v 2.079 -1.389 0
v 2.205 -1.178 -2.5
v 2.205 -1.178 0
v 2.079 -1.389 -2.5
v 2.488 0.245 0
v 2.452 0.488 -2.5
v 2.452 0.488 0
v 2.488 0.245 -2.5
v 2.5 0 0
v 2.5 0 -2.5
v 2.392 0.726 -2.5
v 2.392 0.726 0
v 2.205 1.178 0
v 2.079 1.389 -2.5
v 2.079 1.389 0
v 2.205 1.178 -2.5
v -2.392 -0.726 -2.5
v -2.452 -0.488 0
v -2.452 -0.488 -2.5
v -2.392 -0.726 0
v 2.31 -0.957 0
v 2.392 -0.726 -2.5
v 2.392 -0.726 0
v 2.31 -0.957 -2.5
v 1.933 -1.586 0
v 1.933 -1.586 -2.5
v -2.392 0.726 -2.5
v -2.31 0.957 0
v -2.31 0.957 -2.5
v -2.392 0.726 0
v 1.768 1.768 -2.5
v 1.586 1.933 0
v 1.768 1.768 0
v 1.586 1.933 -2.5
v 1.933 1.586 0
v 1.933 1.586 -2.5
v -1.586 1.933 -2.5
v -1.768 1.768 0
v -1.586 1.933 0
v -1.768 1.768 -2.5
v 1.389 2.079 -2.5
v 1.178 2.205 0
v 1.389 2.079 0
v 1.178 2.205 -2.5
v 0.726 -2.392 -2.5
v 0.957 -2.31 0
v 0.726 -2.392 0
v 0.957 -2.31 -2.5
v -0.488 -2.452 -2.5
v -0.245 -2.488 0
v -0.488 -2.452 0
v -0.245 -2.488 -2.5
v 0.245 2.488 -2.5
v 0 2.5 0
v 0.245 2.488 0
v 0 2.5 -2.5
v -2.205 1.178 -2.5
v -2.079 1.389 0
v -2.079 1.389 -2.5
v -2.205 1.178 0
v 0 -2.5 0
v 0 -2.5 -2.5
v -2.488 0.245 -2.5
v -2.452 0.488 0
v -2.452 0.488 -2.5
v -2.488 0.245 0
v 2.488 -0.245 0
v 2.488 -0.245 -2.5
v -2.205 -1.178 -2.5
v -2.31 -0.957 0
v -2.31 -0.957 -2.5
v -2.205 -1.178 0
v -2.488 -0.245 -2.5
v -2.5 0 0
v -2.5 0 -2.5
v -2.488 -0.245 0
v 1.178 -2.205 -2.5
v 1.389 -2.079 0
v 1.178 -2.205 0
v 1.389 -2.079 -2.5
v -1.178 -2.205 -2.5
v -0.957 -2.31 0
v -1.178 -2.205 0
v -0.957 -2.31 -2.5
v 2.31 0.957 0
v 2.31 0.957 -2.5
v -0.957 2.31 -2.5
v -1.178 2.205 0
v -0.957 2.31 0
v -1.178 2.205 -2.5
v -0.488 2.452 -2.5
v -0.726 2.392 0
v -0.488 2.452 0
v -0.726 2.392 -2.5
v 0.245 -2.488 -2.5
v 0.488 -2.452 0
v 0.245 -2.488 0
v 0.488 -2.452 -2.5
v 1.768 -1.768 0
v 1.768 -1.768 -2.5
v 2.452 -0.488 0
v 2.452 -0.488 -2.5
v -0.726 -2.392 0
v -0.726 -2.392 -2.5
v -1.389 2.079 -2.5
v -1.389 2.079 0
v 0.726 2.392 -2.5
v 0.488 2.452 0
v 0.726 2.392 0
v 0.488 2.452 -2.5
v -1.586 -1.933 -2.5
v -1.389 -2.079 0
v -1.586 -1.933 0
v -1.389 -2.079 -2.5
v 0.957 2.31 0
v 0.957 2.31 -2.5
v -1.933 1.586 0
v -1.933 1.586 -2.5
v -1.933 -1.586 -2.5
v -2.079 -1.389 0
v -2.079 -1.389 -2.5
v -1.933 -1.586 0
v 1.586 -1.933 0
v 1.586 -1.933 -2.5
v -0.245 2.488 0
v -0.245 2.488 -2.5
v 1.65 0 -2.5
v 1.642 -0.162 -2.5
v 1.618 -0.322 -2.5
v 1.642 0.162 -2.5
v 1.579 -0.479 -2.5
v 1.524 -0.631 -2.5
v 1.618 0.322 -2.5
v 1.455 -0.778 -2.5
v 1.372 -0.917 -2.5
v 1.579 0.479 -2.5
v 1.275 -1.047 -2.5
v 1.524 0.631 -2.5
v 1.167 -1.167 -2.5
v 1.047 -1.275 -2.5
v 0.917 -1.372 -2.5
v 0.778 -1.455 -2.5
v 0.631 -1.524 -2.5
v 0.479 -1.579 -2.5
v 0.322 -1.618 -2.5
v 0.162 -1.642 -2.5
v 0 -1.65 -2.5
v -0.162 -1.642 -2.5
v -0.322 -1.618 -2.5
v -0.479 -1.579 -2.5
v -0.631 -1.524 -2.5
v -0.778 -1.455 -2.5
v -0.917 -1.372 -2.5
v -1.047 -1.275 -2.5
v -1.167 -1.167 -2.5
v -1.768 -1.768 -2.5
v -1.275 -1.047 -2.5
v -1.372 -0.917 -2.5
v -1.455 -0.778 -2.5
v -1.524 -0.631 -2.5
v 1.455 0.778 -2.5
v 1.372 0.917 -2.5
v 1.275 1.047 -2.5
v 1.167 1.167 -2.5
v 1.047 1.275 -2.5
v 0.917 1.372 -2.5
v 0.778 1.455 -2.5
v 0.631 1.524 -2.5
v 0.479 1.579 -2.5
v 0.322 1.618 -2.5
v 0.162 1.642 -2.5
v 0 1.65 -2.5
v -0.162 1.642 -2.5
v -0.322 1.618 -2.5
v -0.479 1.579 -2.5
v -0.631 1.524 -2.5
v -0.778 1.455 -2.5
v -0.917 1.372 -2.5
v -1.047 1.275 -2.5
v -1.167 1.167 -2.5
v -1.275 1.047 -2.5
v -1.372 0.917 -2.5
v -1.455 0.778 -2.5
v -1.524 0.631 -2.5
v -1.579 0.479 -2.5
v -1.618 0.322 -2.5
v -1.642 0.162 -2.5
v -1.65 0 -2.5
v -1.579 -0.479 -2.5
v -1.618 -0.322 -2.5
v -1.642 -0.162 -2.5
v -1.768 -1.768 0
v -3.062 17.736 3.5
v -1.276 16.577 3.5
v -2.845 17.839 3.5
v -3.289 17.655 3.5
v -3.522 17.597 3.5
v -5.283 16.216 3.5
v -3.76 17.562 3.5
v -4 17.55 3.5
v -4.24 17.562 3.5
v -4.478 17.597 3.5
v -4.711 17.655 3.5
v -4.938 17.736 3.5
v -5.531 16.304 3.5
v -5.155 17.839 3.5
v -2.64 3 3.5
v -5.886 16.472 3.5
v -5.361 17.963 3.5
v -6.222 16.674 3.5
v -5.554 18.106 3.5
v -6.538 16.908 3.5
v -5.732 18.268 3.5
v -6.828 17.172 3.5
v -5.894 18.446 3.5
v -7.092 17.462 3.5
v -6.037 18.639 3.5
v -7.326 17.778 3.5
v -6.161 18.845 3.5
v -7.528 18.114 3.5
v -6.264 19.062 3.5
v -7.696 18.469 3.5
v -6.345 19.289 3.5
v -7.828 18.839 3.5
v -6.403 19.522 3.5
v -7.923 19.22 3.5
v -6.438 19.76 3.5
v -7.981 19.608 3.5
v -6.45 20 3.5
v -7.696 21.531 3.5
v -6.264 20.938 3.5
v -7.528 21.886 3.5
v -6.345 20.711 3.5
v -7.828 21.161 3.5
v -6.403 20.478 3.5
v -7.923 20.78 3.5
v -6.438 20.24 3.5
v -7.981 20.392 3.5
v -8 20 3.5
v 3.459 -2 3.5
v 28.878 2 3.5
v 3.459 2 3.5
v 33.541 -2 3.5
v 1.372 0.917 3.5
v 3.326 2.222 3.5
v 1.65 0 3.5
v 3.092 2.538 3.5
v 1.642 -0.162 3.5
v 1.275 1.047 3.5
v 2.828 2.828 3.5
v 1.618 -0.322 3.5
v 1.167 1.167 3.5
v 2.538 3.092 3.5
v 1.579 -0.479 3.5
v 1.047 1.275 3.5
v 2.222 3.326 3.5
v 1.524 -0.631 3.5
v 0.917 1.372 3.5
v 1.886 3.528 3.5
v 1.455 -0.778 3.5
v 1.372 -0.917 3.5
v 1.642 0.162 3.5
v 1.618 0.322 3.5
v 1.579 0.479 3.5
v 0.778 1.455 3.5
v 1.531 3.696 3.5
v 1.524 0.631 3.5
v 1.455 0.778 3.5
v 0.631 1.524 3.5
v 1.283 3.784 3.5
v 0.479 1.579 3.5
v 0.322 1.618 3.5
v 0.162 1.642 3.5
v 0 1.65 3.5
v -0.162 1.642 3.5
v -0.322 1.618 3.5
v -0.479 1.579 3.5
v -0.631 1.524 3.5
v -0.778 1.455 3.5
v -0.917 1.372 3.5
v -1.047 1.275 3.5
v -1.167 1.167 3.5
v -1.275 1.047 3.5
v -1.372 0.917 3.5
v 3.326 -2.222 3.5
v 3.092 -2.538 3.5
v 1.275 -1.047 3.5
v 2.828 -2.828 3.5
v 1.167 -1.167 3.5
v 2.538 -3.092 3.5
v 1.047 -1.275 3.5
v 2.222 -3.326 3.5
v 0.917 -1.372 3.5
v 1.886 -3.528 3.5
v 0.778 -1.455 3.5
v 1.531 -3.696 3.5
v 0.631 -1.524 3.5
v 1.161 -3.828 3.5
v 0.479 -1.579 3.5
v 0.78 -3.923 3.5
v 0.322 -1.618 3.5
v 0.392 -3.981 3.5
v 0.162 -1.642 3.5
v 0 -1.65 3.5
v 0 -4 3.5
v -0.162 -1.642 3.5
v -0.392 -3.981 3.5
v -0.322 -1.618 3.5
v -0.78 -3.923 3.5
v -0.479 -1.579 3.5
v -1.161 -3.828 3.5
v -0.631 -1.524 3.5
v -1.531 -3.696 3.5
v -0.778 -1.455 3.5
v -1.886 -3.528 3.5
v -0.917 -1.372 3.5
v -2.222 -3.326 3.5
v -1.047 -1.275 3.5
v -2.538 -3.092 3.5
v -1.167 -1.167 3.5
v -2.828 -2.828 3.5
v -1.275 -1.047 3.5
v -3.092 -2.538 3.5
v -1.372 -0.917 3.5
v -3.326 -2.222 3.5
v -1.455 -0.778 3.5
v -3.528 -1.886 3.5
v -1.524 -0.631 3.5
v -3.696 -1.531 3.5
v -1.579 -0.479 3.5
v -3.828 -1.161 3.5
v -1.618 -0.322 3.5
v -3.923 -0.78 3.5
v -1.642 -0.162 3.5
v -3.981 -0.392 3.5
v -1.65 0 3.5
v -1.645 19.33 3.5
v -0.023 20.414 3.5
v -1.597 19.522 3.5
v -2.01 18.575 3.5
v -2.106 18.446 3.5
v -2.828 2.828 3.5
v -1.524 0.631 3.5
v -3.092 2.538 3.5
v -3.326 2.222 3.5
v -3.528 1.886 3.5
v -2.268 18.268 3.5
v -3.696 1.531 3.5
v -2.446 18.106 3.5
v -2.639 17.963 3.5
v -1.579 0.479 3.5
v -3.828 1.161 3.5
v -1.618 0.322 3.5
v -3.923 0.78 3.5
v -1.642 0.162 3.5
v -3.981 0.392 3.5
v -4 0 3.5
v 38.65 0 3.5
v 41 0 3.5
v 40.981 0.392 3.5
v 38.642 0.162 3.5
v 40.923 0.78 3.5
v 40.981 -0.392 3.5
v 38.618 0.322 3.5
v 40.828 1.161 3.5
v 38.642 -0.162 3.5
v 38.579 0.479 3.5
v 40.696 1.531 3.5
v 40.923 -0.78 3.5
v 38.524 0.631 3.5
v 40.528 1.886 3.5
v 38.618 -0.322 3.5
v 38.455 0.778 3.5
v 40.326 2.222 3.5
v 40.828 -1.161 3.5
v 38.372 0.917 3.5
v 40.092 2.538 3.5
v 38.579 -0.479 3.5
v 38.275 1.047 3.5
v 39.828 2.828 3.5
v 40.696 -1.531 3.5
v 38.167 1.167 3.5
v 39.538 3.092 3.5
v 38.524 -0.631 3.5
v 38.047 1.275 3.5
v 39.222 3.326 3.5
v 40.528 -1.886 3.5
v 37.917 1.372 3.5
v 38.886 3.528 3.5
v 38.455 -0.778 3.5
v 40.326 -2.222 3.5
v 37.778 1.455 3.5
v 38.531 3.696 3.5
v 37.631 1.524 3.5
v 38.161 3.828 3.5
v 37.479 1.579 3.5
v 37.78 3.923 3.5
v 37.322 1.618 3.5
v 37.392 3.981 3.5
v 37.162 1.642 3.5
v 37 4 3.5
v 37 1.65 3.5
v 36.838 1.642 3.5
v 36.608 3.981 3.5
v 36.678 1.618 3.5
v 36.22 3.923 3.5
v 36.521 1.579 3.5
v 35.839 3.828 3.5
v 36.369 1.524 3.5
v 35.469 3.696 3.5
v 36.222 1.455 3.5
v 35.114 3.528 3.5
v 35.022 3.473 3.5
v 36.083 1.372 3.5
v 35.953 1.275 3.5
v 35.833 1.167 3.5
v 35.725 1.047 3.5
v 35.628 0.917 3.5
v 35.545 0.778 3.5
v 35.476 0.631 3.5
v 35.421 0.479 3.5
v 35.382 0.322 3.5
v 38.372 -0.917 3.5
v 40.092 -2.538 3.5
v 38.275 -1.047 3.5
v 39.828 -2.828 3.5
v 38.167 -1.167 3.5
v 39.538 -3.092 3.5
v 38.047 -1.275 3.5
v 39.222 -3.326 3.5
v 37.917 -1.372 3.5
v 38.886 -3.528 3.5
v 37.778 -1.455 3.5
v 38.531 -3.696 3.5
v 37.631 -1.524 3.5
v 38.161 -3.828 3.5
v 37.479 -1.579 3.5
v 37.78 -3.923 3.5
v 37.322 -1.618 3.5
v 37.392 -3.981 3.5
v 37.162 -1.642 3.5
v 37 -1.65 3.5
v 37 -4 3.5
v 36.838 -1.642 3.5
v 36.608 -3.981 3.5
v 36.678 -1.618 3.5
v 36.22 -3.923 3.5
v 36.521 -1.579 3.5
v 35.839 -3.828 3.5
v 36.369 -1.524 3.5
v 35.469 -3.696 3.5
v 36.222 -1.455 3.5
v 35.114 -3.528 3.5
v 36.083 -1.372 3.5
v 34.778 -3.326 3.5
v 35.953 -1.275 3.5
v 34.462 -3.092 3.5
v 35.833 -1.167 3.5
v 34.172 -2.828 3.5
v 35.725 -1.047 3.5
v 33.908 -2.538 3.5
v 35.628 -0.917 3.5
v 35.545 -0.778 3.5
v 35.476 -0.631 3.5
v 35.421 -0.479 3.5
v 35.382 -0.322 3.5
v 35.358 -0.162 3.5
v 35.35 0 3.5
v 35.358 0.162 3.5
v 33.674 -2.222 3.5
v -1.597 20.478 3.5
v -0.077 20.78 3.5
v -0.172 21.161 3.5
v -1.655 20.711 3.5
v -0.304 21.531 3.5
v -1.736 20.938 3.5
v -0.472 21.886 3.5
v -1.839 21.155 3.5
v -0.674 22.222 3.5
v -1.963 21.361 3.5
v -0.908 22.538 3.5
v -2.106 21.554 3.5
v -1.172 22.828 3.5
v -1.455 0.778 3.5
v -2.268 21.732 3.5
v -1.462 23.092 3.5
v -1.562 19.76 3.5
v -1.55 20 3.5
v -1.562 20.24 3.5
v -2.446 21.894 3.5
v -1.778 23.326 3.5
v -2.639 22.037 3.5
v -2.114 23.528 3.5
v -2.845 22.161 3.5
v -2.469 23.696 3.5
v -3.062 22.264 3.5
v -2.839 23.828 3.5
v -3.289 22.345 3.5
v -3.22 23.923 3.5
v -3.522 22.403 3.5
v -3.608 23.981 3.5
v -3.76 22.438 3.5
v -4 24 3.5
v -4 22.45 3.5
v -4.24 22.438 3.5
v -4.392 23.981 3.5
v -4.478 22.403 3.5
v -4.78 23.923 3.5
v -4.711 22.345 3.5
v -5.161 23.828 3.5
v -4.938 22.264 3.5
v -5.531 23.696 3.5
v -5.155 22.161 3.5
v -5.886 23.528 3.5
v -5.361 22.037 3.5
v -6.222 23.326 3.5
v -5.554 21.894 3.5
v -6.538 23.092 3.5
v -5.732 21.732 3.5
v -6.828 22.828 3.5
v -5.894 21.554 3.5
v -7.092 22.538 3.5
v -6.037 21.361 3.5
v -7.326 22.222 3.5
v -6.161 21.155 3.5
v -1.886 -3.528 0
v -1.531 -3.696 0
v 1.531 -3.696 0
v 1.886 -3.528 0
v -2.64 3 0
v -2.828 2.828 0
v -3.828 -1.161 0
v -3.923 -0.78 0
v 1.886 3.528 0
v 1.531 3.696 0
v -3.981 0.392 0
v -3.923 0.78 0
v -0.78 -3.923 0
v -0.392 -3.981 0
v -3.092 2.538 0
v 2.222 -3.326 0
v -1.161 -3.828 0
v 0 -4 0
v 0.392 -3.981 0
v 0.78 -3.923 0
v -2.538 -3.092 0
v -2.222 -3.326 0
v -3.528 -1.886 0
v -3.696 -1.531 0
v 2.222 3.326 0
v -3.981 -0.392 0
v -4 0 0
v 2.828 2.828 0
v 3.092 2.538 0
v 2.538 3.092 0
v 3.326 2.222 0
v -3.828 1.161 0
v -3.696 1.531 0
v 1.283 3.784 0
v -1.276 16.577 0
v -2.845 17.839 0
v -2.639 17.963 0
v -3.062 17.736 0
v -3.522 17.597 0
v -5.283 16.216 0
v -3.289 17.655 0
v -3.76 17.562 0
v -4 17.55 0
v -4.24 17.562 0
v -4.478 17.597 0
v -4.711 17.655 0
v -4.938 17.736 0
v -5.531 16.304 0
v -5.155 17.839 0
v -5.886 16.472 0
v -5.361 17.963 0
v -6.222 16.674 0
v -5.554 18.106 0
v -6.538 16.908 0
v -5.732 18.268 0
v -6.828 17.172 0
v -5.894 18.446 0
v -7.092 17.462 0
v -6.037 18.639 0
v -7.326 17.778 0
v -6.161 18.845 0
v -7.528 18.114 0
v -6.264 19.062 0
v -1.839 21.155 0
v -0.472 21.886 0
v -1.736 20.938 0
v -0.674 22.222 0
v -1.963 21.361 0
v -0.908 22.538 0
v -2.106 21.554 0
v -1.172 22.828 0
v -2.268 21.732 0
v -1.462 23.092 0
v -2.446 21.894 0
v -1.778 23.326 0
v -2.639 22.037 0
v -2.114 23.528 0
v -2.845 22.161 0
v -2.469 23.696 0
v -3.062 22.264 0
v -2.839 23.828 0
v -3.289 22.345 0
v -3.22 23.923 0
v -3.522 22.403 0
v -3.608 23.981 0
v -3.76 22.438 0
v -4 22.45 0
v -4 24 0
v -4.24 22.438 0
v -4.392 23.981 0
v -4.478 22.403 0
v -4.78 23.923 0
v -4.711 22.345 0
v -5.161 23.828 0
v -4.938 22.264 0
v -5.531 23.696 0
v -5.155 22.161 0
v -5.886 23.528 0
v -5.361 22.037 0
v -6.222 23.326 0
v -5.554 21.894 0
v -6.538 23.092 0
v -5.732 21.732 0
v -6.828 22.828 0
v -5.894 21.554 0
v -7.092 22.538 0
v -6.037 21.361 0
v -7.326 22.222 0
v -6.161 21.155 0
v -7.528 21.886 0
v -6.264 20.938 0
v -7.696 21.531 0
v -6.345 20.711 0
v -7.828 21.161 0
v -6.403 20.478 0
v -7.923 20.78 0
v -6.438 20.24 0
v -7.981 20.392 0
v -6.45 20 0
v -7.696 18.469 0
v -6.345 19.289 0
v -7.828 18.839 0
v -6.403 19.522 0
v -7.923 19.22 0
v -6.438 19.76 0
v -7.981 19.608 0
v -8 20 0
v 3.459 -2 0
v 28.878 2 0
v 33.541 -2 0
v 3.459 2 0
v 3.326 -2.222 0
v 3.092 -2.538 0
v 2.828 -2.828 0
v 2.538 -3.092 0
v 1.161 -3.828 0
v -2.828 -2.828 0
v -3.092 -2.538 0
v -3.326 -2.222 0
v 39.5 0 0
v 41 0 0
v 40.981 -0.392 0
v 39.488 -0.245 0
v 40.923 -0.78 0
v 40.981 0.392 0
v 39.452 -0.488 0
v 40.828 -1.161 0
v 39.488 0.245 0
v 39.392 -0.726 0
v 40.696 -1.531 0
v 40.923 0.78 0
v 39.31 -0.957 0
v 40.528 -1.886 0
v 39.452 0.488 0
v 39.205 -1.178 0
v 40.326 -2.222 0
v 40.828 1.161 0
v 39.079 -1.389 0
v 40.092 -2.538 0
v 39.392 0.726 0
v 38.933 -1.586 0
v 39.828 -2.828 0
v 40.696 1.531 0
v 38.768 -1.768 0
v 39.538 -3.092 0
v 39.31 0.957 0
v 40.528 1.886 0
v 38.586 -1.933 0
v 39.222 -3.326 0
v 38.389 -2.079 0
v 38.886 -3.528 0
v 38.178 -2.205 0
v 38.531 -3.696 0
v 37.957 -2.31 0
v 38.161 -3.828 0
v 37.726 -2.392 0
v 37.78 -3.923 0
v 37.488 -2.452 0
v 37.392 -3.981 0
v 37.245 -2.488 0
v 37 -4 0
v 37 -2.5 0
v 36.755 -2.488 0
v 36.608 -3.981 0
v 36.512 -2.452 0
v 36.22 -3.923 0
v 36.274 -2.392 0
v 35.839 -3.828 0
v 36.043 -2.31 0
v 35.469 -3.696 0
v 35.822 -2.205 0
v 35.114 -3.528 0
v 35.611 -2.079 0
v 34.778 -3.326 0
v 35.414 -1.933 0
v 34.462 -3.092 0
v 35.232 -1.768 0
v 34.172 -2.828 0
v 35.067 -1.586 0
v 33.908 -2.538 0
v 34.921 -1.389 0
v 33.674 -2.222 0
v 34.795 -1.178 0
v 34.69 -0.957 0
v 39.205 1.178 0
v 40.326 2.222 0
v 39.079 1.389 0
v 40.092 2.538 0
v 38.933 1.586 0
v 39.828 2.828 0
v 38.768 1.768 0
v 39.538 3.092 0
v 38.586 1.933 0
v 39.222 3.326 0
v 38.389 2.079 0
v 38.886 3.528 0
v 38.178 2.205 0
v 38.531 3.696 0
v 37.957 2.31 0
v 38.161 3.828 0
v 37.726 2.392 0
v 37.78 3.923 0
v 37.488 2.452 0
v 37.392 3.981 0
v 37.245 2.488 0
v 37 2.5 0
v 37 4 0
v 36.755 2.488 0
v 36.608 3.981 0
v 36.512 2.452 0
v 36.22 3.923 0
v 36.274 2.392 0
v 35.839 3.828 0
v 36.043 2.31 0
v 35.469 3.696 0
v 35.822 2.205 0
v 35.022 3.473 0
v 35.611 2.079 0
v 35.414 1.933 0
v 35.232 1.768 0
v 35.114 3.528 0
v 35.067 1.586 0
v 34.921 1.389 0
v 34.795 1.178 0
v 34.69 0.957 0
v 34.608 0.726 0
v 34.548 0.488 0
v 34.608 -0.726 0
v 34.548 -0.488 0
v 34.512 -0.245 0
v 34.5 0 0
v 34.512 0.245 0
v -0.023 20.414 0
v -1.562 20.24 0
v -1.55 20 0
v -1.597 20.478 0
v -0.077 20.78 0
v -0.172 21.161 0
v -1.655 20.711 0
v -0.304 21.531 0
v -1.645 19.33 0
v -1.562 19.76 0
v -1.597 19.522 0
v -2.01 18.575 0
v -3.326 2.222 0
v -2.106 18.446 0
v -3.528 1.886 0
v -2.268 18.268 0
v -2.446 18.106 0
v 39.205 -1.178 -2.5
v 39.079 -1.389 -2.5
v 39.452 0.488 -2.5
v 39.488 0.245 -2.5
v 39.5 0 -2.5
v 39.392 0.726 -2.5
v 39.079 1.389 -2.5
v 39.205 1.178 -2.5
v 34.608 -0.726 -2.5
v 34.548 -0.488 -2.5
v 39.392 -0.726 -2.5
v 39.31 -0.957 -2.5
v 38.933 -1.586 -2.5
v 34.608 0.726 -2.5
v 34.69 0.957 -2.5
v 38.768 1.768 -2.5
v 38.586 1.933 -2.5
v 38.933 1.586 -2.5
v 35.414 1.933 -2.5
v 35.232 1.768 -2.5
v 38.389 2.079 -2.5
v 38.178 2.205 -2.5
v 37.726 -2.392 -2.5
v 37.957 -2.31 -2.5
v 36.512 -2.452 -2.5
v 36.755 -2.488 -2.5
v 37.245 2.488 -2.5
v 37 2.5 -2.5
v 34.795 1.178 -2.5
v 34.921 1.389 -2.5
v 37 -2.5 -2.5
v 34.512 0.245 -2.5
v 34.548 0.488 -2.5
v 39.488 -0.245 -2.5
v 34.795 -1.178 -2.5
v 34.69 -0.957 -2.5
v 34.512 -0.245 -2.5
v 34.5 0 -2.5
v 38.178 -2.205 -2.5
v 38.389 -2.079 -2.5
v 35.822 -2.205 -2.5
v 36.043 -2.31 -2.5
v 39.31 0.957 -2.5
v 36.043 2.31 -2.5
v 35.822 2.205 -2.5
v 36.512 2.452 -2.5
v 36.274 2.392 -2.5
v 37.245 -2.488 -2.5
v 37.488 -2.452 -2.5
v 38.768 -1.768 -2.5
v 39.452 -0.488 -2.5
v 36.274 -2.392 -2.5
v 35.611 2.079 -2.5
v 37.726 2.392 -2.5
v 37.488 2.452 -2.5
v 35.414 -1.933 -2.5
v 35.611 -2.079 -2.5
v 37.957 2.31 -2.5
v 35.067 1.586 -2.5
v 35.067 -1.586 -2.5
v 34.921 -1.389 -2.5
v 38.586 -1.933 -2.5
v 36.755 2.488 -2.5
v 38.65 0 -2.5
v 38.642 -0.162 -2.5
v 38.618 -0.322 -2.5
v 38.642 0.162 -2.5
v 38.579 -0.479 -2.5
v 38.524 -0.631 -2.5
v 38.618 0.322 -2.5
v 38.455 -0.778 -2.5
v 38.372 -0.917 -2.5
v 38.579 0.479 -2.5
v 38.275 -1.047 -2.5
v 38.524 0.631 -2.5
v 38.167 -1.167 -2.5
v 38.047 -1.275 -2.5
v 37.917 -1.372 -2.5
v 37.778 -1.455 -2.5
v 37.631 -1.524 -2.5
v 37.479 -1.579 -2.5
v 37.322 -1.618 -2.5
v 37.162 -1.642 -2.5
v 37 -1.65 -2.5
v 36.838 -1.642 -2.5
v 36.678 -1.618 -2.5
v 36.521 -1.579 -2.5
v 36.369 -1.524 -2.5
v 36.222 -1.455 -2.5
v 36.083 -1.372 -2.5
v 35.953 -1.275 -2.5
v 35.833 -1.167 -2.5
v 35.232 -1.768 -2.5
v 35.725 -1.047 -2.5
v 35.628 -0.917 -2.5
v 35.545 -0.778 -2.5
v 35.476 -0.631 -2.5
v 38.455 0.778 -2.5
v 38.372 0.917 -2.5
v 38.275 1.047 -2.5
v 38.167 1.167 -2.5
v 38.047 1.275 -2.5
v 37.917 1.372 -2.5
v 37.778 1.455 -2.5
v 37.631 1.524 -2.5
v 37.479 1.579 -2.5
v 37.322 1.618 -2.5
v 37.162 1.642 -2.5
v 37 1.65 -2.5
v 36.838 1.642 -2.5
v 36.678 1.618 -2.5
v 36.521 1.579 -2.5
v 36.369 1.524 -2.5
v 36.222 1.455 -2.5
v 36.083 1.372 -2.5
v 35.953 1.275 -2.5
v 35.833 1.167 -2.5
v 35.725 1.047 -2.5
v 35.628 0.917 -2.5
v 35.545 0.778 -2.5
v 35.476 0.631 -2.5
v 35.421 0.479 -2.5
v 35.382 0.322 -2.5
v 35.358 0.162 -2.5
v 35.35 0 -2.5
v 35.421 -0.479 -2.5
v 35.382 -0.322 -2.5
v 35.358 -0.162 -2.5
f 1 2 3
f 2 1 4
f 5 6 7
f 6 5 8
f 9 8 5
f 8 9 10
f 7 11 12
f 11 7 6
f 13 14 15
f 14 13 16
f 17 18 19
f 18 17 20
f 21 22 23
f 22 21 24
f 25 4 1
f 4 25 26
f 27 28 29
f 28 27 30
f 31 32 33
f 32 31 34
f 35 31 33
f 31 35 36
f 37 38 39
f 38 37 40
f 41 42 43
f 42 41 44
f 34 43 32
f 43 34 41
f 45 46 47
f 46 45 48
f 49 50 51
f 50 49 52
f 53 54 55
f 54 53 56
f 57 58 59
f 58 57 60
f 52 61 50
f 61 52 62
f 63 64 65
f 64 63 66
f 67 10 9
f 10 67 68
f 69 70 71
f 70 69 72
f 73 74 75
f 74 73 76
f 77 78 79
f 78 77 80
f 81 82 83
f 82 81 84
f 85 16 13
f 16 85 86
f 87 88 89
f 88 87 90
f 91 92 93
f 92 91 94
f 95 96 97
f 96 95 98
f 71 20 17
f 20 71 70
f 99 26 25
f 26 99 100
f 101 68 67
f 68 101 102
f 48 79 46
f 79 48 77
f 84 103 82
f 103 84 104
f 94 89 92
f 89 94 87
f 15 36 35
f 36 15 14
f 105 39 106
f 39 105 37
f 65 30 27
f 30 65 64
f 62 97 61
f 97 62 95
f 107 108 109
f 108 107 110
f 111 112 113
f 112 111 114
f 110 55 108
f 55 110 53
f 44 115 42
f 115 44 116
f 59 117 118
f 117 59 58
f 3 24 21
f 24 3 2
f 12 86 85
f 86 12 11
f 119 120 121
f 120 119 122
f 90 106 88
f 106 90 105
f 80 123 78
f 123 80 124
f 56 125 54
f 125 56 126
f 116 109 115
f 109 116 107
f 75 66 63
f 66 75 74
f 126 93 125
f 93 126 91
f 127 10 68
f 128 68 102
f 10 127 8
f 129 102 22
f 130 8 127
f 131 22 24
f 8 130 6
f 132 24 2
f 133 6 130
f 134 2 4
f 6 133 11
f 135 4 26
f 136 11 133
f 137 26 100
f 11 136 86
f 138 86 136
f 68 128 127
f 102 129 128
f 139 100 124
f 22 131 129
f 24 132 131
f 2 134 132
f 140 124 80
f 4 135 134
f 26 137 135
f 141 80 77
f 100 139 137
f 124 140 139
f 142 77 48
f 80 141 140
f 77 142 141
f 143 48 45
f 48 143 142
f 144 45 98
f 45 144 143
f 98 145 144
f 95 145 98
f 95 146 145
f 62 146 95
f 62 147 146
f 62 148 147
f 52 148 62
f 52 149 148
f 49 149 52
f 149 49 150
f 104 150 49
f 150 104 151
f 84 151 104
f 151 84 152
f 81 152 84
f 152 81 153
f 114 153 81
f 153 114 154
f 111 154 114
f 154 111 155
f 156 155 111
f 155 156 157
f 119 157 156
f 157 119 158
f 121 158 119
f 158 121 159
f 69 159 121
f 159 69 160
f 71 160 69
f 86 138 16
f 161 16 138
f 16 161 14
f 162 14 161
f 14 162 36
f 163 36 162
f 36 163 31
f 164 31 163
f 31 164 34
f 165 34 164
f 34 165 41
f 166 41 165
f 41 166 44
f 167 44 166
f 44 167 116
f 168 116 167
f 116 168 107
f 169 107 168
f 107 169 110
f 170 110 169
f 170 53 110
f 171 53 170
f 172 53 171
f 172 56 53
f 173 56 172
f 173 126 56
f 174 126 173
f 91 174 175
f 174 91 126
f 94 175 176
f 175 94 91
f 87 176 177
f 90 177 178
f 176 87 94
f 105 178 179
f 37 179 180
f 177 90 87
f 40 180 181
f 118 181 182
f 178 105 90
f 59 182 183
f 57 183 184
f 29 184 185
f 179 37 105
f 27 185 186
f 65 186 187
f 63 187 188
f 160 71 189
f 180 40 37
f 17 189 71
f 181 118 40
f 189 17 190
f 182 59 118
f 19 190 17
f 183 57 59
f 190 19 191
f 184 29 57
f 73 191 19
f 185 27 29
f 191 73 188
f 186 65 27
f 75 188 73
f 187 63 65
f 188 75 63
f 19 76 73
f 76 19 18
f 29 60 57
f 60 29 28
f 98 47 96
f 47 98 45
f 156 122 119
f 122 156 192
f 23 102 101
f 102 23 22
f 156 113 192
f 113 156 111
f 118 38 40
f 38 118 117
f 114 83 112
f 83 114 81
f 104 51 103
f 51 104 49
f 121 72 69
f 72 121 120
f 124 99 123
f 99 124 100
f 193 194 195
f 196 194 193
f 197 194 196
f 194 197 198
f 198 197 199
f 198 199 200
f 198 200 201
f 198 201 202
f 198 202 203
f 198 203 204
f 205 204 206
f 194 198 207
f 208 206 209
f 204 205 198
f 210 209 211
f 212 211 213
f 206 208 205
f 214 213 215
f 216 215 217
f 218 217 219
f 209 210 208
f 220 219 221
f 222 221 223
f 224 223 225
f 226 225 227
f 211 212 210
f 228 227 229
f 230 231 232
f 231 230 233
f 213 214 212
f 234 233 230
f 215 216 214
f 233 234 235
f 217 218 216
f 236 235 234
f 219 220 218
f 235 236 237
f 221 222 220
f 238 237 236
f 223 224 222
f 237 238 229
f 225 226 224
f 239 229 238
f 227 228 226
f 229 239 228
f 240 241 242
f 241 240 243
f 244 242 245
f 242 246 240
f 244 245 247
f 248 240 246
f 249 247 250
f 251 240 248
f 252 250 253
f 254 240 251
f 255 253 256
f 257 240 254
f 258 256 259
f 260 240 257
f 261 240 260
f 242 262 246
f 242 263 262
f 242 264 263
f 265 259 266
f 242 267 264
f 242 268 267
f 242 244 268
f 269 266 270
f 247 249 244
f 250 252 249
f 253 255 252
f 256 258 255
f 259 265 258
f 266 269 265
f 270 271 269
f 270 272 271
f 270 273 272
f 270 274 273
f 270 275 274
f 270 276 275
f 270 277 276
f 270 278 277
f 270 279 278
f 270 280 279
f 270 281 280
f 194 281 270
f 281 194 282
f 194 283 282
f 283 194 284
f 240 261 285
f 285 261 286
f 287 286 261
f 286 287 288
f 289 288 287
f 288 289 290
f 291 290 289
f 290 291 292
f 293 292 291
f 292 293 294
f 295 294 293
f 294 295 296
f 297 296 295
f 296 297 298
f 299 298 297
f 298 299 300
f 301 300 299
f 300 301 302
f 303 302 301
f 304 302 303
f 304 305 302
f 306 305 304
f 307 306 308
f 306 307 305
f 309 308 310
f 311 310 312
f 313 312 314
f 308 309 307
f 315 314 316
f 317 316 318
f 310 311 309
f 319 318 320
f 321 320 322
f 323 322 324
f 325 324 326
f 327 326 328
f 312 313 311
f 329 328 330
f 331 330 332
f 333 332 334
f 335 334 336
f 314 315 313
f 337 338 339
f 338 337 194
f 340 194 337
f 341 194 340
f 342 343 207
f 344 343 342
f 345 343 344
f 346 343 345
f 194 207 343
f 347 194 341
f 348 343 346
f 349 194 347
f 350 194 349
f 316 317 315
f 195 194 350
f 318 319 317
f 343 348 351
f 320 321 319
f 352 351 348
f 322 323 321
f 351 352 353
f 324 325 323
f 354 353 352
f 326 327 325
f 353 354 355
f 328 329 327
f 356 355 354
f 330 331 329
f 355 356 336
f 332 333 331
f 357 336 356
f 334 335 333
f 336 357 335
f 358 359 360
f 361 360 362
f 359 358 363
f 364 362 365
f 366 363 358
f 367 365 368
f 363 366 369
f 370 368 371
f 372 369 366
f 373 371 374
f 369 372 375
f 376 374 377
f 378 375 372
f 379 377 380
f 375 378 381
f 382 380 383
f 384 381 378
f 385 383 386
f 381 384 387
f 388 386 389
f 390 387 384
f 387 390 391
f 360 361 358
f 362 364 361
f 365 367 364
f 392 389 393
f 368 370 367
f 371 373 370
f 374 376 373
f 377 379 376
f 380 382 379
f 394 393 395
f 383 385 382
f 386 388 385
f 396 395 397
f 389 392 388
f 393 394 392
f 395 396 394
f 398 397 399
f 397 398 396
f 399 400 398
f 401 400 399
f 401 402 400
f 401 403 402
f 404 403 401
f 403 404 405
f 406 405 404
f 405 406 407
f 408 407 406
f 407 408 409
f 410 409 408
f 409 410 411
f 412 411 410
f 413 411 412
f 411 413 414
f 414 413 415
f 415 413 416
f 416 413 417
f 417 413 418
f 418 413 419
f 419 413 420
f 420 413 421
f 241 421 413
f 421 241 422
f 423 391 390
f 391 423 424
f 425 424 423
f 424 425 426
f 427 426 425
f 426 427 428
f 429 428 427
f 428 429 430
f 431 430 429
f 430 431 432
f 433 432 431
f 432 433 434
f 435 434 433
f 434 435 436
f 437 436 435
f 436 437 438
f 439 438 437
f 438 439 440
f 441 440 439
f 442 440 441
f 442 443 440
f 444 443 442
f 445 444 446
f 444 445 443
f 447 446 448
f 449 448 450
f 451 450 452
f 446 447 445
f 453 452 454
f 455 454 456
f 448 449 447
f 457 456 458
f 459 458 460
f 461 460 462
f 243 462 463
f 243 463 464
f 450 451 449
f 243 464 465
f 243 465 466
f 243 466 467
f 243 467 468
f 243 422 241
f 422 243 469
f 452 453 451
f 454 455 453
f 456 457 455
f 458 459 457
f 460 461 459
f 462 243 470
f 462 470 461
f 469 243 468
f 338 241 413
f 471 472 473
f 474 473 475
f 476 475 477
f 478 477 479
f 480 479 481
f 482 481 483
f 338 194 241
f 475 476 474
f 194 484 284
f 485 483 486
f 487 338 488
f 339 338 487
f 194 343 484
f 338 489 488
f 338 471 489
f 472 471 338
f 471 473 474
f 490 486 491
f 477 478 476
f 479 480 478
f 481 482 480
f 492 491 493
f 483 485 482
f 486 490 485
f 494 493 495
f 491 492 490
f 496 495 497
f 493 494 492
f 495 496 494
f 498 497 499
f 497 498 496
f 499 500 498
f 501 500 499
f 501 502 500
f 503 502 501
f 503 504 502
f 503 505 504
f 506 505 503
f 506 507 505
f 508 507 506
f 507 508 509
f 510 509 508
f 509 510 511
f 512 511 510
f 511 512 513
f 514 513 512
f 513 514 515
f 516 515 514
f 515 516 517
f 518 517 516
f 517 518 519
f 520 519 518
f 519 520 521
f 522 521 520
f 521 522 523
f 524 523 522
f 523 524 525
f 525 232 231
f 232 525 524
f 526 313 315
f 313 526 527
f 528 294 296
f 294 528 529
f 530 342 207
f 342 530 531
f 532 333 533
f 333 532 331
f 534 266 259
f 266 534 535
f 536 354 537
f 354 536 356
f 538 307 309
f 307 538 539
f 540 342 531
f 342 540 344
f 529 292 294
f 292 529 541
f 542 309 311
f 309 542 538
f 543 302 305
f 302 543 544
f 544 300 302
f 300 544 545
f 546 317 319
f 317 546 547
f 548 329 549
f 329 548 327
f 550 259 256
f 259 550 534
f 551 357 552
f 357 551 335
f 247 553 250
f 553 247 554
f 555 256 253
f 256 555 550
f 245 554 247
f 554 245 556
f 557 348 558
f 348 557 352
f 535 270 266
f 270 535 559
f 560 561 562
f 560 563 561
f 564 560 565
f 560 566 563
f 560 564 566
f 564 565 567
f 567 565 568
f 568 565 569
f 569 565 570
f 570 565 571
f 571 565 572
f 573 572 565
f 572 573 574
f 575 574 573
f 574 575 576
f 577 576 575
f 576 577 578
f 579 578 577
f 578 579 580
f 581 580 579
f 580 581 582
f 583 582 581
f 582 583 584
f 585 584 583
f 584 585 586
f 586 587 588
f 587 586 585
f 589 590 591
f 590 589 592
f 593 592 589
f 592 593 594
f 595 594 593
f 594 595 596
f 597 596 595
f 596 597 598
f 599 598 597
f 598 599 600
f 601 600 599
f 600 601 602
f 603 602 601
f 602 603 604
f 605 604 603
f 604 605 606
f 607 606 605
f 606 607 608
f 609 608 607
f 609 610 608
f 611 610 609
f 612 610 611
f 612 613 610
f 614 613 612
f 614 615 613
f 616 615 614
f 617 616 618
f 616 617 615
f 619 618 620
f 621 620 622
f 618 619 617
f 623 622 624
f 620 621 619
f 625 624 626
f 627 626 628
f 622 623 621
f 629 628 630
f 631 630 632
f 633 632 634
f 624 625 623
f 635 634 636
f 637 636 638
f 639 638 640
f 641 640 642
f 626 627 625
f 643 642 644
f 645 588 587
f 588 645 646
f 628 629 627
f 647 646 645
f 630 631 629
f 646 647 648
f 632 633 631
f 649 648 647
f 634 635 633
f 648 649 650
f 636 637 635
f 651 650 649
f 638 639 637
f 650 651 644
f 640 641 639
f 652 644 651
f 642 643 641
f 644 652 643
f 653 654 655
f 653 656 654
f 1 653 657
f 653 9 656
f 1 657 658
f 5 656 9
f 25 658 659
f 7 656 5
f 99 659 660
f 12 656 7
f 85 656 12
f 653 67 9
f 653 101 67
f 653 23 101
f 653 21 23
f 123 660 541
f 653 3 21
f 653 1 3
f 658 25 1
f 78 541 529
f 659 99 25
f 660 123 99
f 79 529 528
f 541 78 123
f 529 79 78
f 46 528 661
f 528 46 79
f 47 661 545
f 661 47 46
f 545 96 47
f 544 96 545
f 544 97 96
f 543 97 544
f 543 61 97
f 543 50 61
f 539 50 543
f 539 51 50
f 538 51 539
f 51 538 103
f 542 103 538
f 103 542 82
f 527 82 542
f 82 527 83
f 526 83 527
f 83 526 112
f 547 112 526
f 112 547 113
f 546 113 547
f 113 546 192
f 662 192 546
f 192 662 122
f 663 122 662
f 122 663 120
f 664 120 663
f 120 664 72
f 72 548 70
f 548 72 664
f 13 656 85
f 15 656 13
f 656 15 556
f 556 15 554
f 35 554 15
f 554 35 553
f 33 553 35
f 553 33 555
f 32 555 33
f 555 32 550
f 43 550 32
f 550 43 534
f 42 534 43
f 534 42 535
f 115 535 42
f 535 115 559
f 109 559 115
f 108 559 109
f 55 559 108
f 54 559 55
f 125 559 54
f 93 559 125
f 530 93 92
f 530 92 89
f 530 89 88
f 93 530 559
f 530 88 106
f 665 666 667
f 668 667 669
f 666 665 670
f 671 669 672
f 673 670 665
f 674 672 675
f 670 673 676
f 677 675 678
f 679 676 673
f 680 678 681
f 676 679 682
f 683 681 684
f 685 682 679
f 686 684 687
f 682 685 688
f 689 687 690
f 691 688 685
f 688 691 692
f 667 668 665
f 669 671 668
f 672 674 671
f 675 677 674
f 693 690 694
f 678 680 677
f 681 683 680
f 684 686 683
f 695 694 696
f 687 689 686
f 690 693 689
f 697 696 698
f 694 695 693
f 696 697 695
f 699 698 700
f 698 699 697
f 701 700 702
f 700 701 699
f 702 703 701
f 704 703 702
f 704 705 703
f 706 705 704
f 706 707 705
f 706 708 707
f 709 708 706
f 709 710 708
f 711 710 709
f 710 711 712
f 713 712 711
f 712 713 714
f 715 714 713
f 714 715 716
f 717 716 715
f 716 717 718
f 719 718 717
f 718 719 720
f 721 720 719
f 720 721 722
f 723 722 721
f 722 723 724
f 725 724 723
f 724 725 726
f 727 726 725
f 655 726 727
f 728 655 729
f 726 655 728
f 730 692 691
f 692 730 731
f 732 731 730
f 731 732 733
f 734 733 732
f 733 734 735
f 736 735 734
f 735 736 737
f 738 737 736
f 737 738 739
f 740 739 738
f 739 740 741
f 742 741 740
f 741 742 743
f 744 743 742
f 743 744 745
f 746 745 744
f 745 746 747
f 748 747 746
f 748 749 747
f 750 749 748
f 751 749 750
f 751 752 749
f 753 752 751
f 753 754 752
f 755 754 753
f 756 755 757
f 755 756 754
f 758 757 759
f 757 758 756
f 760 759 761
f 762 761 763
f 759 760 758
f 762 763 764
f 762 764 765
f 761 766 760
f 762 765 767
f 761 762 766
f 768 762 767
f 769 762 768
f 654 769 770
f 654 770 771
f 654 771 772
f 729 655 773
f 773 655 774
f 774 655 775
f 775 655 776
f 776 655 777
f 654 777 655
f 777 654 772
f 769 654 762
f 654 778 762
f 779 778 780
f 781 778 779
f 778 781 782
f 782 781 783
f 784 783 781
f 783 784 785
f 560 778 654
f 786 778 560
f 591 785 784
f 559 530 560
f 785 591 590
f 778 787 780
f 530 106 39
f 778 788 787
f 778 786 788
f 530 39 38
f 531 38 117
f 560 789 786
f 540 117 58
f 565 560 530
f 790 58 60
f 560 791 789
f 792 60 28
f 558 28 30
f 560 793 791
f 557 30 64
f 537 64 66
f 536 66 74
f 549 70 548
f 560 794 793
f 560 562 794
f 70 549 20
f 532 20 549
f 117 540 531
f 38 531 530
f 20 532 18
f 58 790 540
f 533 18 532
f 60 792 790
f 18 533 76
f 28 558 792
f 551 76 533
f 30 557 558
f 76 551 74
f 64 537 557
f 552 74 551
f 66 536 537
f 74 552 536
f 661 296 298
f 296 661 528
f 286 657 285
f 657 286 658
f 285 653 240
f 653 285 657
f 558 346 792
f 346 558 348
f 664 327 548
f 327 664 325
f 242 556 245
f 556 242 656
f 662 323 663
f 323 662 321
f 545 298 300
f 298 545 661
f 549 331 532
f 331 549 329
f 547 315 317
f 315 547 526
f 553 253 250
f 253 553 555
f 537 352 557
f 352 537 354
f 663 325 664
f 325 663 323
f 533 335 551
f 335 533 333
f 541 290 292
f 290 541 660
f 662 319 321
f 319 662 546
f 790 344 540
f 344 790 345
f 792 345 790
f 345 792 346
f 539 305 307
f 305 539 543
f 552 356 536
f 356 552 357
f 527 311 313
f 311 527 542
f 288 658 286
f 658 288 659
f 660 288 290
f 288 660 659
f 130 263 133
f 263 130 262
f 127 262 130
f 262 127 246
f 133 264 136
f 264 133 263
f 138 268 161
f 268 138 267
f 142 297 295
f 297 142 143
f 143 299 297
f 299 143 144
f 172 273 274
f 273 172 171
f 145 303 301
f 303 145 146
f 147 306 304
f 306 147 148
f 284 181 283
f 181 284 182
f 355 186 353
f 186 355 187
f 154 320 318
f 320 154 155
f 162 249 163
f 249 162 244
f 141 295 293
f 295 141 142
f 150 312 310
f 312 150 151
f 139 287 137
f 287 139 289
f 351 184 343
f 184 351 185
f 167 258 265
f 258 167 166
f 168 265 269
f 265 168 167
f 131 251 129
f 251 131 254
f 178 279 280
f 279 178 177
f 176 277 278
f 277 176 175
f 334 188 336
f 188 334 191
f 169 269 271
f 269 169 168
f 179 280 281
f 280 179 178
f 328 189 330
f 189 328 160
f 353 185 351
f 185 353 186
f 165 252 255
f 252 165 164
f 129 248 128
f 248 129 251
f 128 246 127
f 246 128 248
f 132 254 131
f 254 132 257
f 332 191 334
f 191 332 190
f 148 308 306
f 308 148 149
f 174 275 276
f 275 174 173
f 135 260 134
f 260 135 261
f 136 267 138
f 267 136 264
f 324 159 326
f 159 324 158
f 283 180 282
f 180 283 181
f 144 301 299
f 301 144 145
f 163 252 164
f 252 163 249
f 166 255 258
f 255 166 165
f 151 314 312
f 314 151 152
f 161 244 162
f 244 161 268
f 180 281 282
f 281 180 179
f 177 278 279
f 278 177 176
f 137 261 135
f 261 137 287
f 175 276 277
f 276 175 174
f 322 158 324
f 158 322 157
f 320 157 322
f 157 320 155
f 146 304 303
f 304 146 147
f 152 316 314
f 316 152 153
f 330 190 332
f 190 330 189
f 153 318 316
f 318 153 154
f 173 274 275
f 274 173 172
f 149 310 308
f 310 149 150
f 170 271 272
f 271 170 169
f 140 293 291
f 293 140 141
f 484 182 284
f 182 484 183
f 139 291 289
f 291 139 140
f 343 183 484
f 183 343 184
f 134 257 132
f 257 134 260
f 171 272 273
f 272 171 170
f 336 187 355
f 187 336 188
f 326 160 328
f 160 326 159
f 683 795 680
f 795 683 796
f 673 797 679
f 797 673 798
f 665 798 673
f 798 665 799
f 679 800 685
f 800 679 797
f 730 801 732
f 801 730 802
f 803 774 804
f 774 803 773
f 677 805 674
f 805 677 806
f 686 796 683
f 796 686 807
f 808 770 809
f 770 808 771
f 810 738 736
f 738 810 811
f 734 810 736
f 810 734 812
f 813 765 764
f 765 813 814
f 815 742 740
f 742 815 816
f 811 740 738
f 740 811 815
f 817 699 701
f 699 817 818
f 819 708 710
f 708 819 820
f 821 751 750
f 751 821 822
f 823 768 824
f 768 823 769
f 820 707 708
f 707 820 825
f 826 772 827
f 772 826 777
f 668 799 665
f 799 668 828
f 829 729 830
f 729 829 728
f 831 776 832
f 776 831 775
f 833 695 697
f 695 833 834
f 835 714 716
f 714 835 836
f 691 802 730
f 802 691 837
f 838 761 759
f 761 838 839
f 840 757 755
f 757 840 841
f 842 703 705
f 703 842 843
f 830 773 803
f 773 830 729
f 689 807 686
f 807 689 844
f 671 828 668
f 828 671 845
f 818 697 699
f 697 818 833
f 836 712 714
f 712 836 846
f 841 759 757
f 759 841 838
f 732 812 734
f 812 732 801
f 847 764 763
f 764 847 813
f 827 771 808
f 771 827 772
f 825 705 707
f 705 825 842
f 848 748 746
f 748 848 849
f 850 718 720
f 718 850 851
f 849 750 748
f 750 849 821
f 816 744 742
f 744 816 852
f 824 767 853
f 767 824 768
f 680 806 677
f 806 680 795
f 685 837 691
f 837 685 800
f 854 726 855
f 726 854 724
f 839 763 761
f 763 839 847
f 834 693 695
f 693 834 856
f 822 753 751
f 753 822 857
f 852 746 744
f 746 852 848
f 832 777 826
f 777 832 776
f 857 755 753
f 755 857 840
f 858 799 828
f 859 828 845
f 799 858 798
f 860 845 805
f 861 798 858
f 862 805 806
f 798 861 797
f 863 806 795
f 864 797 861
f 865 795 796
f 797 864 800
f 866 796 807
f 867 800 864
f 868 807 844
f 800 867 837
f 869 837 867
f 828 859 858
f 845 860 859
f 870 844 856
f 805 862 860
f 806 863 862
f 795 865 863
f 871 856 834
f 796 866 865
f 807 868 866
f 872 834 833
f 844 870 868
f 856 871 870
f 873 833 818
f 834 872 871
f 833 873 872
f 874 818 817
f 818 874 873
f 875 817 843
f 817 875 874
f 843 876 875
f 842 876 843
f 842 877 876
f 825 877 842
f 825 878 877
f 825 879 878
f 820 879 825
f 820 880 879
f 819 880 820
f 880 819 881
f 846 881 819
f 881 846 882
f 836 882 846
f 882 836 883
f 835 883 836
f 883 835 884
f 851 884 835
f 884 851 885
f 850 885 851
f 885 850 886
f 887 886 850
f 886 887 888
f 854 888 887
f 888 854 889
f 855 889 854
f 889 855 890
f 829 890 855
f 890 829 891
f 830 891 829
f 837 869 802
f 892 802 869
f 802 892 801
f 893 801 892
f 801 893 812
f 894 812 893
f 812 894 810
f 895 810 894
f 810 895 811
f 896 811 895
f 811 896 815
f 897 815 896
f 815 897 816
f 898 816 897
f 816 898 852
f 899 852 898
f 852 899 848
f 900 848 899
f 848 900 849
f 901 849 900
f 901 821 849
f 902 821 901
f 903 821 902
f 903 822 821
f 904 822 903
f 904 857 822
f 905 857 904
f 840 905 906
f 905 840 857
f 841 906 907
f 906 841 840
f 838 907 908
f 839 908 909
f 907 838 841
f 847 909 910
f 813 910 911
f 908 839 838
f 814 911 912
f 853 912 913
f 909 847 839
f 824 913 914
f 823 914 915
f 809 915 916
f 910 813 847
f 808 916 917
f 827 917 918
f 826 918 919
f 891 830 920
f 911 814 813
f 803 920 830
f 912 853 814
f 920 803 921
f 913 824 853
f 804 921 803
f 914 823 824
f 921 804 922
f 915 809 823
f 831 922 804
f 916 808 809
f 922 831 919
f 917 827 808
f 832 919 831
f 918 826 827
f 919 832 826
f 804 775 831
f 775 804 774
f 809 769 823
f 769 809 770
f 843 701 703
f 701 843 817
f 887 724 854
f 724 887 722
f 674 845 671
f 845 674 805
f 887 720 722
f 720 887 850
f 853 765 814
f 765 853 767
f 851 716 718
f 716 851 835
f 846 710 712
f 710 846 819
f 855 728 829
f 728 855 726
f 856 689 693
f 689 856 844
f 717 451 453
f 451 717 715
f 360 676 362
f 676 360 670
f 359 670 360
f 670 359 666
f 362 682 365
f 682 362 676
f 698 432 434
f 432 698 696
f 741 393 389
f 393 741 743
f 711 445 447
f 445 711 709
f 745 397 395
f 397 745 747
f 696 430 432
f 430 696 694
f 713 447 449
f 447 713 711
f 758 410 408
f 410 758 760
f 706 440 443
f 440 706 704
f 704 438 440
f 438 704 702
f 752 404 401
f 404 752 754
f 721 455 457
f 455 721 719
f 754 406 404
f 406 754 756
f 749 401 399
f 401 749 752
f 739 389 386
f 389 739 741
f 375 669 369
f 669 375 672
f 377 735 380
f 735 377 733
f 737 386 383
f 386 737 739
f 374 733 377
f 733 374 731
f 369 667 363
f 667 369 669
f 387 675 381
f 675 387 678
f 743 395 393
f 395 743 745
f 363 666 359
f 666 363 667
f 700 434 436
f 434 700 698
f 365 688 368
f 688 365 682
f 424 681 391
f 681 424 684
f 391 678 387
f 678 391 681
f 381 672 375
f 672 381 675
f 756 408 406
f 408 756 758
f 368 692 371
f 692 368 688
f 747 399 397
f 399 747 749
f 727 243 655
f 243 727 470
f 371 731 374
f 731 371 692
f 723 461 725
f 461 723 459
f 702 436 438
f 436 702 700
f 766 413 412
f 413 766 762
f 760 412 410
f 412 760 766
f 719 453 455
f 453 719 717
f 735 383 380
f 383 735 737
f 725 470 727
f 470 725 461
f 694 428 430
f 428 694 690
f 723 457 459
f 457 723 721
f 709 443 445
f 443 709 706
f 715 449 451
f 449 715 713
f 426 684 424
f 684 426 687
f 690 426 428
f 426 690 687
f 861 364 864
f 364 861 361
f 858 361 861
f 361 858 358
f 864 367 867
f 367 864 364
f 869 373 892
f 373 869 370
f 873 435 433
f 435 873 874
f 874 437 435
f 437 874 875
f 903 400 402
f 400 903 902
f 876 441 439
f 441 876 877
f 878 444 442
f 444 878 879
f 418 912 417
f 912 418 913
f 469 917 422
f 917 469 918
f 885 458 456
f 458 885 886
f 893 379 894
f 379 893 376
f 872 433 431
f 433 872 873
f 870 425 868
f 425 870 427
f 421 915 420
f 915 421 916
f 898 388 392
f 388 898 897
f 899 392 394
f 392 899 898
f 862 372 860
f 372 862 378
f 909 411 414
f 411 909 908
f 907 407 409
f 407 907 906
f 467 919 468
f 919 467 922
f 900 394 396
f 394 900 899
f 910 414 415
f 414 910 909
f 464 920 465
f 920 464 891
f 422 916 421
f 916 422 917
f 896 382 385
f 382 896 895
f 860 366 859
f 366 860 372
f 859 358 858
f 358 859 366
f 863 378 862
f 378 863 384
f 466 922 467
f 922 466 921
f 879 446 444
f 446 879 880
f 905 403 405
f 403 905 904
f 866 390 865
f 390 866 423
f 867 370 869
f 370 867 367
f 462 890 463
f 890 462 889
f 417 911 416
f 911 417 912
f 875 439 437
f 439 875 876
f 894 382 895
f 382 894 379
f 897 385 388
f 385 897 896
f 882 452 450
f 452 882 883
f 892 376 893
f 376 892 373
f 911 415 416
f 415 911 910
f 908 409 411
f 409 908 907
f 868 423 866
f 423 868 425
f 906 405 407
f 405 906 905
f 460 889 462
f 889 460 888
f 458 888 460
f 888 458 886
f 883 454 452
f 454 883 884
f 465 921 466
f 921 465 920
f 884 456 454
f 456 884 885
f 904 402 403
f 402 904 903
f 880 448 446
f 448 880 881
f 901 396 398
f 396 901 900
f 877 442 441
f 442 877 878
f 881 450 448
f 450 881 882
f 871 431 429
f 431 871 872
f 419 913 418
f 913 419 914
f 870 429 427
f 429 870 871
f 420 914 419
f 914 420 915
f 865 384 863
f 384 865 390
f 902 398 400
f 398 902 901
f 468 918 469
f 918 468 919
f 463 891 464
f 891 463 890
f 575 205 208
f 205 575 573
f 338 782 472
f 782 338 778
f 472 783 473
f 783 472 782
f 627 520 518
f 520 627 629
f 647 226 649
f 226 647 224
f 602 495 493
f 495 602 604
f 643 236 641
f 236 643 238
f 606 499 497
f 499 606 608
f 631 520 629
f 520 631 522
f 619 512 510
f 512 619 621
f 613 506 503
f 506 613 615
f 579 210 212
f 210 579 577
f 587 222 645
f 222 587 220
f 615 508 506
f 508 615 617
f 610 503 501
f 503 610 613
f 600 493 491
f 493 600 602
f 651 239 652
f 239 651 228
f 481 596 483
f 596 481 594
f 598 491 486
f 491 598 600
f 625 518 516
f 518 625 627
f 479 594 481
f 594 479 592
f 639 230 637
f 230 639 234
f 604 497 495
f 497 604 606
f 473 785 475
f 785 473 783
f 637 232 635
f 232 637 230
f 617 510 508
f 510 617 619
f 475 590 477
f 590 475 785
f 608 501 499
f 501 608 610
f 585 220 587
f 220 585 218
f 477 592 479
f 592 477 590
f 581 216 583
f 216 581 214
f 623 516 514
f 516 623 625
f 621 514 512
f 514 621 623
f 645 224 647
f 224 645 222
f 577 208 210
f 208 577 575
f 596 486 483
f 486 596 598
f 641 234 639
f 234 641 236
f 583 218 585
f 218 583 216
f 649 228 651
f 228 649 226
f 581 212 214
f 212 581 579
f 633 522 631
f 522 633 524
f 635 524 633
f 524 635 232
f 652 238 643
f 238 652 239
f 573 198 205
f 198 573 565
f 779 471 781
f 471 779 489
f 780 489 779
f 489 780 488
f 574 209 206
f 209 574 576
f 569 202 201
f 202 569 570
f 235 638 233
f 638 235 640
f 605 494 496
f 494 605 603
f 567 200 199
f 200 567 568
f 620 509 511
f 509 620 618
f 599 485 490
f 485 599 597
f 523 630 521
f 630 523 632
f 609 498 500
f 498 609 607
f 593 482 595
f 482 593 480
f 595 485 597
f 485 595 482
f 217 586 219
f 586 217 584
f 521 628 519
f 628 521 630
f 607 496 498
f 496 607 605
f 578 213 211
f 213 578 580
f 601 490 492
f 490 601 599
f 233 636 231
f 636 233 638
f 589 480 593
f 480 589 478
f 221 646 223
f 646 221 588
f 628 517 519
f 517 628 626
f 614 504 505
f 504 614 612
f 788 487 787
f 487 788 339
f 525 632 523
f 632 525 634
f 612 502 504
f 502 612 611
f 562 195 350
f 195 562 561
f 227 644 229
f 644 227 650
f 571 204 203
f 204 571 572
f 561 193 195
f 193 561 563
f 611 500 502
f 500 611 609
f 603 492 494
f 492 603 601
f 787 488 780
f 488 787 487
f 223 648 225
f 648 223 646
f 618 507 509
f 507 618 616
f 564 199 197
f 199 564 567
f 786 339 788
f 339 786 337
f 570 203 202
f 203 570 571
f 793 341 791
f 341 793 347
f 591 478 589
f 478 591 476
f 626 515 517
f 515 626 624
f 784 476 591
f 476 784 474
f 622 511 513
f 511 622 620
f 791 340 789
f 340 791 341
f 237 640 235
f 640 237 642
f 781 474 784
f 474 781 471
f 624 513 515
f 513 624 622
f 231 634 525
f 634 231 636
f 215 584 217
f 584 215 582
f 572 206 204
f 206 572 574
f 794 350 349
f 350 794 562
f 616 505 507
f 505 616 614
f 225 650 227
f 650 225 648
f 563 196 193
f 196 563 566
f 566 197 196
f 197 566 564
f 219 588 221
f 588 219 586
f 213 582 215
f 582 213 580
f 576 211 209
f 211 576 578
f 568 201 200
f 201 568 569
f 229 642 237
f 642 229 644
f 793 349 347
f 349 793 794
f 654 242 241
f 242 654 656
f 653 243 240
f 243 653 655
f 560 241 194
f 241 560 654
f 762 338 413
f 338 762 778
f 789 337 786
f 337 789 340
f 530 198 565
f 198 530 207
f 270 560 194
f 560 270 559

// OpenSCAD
$fn=64;

// RIGHT
//translate([0, 0, 0]) difference() {
//  union() {
//    cylinder(h=6, d=5);
//    cylinder(h=3.5, d=8);
//  }
//  cylinder(h=6, d=3.3);
//}
//translate([3, -2, 0]) cube([31, 4, 3.5]);
//translate([37, 0, 0]) difference() {
//  union() {
//    cylinder(h=6, d=5);
//    cylinder(h=3.5, d=8);
//  }
//  cylinder(h=6, d=3.3);
//}
//translate([36, 3, 0]) rotate([0, 0, 180-25.8]) cube([41, 4, 3.5]);
//translate([-4, 20, 0]) difference() {
//  cylinder(h=3.5, d=8);
//  cylinder(h=3.5, d=4.9);
//}
//rotate([0, 0, 101.31]) translate([3, -2, 0]) cube([14.3, 4, 3.5]);

//translate([-2.5, -2, 6]) color("red") cube([42, 4, 5]);

// LEFT
difference() {
  union() {
    translate([0, 0, -2.5]) cylinder(h=6, d=5);
    cylinder(h=3.5, d=8);
  }
  translate([0, 0, -2.5]) cylinder(h=6, d=3.3);
}
translate([3, -2, 0]) cube([31, 4, 3.5]);
translate([37, 0, 0]) difference() {
  union() {
    translate([0, 0, -2.5]) cylinder(h=6, d=5);
    cylinder(h=3.5, d=8);
  }
  translate([0, 0, -2.5]) cylinder(h=6, d=3.3);
}
translate([36, 3, 0]) rotate([0, 0, 180-25.8]) cube([41, 4, 3.5]);
translate([-4, 20, 0]) difference() {
  cylinder(h=3.5, d=8);
  cylinder(h=3.5, d=4.9);
}
rotate([0, 0, 101.31]) translate([3, -2, 0]) cube([14.3, 4, 3.5]);
